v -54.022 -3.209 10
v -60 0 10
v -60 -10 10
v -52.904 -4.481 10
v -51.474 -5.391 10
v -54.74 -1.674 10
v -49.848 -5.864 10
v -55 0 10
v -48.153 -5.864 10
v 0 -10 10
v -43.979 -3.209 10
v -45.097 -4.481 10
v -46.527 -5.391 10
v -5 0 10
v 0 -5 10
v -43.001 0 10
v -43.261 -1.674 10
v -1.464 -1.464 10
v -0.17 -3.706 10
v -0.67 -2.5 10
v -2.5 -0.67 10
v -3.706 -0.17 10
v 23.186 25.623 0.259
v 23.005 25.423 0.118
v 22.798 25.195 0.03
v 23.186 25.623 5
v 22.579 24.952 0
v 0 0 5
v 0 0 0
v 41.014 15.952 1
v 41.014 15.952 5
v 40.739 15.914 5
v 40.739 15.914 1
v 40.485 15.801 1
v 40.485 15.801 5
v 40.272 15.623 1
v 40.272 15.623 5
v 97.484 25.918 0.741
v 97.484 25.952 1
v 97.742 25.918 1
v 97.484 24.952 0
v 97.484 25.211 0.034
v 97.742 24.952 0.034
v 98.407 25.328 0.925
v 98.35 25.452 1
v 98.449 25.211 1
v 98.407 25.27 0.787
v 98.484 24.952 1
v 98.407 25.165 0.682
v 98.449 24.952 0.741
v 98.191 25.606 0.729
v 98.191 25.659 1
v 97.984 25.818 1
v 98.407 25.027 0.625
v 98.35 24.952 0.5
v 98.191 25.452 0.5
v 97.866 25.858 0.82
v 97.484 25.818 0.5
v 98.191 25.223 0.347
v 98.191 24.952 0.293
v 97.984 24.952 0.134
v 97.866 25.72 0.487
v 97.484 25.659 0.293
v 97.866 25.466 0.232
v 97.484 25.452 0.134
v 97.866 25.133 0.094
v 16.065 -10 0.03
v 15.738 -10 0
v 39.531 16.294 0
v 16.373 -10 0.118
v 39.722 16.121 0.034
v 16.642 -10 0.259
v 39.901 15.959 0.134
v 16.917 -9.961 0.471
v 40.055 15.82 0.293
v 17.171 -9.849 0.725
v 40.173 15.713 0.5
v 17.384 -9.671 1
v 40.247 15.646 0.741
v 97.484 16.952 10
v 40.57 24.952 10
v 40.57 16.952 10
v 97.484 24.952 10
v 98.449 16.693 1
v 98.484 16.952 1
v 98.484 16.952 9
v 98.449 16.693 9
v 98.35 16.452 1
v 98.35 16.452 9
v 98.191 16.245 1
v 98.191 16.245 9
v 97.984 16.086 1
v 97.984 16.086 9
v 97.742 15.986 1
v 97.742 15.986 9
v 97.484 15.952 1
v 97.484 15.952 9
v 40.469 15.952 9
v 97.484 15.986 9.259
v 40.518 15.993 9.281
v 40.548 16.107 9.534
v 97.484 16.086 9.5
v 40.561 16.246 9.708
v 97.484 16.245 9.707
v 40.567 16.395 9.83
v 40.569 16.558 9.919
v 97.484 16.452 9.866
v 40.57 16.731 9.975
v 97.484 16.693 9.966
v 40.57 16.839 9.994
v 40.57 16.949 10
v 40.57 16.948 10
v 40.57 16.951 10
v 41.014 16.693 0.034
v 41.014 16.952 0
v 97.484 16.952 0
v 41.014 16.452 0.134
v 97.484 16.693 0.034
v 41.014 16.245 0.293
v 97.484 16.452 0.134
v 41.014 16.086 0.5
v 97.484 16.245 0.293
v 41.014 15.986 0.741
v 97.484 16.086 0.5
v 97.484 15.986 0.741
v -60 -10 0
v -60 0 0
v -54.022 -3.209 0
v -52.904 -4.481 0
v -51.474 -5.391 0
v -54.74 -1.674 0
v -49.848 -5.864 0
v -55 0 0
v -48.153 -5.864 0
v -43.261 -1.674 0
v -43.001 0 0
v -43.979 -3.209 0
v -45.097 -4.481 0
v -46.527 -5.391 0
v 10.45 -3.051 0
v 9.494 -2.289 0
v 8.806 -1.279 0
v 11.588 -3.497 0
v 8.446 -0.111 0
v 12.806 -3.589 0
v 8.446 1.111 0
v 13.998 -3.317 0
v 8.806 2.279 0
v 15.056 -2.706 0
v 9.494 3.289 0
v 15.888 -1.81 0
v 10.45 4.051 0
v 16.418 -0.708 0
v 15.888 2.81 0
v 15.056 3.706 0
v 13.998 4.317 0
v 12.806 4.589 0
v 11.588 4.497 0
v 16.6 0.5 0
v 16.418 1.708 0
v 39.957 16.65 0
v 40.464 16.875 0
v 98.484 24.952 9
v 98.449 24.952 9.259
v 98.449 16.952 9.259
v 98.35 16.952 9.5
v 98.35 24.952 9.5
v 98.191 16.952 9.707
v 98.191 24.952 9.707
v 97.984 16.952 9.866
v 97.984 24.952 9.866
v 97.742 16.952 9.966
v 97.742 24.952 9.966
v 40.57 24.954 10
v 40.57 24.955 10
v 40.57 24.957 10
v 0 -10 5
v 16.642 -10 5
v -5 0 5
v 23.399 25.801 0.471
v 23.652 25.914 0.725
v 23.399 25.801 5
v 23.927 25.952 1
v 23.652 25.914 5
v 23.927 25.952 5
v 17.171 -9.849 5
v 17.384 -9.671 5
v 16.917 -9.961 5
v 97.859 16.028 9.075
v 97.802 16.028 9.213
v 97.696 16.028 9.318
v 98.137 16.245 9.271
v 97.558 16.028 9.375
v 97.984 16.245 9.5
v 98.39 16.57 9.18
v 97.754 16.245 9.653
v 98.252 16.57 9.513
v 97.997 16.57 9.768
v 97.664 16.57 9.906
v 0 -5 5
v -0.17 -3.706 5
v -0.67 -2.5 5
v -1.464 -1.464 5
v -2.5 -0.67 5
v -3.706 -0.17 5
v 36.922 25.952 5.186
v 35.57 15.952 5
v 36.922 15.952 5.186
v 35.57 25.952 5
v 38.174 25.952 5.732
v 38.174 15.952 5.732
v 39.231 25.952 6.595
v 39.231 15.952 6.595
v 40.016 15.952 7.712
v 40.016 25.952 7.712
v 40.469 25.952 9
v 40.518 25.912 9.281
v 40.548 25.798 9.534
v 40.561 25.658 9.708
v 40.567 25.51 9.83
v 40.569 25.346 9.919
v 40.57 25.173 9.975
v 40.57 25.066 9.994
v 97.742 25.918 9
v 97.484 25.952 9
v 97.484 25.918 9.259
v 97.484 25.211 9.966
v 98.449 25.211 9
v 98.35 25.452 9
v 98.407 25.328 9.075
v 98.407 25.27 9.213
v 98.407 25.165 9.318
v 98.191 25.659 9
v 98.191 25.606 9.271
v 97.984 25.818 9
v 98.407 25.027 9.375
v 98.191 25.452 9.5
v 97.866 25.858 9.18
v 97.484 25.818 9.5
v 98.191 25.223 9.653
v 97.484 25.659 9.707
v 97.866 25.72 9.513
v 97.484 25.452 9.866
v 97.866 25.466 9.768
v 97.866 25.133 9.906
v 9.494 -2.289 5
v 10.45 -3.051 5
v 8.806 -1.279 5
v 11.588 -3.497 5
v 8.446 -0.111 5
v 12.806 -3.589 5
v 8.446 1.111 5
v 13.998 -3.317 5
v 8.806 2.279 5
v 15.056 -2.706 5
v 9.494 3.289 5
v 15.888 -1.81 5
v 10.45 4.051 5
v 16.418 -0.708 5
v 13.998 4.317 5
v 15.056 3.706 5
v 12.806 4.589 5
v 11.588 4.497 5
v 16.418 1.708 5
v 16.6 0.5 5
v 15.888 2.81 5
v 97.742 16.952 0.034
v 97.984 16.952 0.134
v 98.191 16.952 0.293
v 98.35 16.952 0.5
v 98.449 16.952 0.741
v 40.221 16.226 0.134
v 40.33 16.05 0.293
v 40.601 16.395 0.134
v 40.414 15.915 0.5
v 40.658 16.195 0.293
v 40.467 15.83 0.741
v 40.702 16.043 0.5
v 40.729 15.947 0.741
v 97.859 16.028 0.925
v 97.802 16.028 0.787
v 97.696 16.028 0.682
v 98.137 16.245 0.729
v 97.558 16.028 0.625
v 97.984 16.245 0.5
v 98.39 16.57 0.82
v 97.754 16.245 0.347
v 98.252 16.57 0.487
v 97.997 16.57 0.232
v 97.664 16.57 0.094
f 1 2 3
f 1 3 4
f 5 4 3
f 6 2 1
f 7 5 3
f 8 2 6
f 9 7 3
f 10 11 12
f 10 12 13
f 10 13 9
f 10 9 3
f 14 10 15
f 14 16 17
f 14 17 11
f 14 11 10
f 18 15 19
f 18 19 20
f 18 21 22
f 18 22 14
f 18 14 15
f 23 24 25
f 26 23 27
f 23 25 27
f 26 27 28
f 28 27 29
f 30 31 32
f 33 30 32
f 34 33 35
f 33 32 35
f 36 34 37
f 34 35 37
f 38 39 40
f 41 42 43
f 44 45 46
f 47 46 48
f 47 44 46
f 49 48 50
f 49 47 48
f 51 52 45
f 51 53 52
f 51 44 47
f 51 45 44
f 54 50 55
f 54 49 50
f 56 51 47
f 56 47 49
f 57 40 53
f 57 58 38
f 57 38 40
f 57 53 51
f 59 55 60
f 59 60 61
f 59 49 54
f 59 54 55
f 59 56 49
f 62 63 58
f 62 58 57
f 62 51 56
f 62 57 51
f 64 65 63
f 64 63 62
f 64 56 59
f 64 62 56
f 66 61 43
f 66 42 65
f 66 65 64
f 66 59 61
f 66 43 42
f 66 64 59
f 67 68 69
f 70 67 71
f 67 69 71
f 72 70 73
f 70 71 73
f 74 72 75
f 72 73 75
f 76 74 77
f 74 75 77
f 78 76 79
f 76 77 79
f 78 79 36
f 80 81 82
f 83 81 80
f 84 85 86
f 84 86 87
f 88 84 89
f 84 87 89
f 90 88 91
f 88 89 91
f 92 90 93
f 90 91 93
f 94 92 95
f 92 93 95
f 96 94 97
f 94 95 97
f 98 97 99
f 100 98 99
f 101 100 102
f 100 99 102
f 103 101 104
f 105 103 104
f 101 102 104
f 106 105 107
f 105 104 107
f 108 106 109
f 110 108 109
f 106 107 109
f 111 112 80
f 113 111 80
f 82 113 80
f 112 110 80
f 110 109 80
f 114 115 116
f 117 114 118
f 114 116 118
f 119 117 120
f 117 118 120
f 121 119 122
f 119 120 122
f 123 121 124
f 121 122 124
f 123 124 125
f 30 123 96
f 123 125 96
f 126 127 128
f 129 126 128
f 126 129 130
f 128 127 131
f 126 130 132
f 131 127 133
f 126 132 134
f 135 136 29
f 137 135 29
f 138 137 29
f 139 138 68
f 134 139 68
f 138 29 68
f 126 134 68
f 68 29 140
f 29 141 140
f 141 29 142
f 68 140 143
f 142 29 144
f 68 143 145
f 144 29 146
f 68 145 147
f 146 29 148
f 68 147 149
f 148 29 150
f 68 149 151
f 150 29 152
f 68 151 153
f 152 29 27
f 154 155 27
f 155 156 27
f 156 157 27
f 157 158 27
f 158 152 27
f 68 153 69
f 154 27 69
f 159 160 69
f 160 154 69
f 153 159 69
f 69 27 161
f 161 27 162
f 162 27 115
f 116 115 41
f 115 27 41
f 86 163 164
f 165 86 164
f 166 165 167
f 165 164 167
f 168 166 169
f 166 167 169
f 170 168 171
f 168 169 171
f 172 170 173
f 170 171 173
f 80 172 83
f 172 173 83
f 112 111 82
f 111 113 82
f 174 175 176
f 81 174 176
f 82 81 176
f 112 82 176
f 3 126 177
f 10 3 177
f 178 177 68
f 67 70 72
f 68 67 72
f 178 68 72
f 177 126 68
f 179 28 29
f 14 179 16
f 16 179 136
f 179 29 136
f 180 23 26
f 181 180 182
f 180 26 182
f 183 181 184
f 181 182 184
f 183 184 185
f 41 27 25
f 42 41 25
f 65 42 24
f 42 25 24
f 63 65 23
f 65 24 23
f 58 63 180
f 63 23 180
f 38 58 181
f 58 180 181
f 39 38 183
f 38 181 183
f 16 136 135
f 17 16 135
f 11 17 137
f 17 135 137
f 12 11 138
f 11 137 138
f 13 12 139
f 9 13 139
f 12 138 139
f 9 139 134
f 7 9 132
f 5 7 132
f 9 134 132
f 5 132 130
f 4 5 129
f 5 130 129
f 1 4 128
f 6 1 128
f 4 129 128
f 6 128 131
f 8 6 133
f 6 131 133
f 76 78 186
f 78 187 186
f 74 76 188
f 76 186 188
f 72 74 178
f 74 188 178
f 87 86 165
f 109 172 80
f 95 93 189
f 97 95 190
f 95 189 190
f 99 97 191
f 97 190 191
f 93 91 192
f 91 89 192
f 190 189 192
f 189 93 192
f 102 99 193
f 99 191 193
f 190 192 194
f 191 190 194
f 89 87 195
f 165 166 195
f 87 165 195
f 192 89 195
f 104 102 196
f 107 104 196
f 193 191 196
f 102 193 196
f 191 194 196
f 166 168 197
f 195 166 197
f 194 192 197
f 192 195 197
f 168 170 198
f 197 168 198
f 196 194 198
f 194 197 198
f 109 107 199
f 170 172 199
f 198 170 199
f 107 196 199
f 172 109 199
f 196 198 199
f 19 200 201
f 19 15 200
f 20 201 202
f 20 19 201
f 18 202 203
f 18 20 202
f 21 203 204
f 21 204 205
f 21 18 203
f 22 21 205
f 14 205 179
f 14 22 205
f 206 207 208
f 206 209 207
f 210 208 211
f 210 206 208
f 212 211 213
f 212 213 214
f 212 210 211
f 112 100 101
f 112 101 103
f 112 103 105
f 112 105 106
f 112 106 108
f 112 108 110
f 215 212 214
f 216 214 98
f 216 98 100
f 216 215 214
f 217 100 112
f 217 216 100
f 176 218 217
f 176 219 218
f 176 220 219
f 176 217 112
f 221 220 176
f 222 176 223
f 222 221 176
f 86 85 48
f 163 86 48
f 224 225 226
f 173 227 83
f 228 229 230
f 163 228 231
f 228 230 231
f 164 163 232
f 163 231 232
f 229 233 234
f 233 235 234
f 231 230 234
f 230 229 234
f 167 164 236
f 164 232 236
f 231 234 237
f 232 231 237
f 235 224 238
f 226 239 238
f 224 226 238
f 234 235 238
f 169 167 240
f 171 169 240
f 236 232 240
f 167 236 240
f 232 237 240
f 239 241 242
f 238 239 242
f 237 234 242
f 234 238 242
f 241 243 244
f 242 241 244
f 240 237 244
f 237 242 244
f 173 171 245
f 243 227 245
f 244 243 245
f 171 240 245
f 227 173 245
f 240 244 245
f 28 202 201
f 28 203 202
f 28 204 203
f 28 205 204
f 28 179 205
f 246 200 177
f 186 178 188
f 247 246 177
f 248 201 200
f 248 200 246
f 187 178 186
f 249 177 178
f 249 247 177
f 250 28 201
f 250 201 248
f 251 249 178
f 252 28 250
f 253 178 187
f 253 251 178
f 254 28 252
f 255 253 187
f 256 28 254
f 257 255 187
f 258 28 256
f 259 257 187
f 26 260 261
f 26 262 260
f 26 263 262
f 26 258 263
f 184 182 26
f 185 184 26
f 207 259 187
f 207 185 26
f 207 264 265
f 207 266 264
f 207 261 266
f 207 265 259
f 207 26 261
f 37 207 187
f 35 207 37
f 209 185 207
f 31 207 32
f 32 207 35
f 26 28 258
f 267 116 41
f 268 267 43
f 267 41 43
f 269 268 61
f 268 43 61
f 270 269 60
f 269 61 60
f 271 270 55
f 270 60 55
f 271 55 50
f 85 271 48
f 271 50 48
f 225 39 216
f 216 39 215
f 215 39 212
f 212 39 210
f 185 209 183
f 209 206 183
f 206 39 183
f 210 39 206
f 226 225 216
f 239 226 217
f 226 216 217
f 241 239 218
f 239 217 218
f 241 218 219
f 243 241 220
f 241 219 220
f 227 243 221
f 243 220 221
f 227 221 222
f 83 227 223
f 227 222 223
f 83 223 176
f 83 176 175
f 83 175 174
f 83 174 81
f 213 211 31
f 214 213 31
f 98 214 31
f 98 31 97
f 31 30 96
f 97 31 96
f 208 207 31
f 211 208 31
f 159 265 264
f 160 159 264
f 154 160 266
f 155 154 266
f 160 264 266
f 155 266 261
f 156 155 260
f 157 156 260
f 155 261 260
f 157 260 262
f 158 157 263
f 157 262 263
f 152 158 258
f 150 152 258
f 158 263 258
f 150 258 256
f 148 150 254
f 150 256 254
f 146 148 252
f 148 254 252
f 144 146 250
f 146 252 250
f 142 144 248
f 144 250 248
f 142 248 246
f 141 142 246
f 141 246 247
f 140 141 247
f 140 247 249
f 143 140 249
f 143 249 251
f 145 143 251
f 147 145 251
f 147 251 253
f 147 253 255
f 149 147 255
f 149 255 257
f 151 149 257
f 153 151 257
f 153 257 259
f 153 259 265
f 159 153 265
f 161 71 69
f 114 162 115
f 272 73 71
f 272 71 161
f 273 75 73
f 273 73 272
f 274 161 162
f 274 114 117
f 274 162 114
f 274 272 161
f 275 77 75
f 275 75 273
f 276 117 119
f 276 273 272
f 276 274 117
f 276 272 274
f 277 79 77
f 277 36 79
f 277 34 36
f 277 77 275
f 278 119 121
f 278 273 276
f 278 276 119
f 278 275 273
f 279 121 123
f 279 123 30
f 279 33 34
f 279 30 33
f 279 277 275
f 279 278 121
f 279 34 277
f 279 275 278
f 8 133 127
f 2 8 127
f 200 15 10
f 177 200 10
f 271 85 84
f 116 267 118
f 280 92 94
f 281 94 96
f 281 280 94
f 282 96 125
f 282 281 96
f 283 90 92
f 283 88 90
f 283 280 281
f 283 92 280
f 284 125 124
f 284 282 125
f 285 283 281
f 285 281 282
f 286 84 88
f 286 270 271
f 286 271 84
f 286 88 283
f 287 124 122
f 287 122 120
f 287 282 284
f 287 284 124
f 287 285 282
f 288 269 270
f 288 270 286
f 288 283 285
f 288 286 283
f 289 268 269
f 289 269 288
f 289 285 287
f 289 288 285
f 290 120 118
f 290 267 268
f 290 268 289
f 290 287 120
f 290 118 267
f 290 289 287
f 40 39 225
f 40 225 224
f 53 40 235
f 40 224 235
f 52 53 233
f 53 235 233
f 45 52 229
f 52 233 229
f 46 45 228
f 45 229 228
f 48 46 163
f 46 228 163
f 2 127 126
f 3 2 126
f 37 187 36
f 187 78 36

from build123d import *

# Parameters (mm, degrees)
F1_DEPTH = 10
F2_R     = 4.1
F3_DEPTH = 5
F4_DEPTH = 10
F5_R     = 1
F6_R     = 4.99999
F7_R     = 5


# Not quite as in the source:
# - a fillet or chamfer is up to 0.001 mm smaller than in the source, because OpenCascade refuses the exact size


with BuildPart() as f1:
    # F0 (on Top) → F1 (new body)
    with BuildSketch(Plane.XY):
        with BuildLine():
            Line((23.4835705605, 25.9523007406), (0, 0))
            Line((0, 0), (-43.0009548823, 0))
            ThreePointArc((-43.0009548823, 0), (-49.0004774411, -5.9243094089), (-55, 0))
            Line((-55, 0), (-60, 0))
            Line((-60, 0), (-60, -10))
            Line((-60, -10), (17.0862320811, -10))
            Line((17.0862320811, -10), (40.5698026416, 15.9523007406))
            Line((40.5698026416, 15.9523007406), (98.4835705605, 15.9523007406))
            Line((98.4835705605, 15.9523007406), (98.4835705605, 25.9523007406))
            Line((98.4835705605, 25.9523007406), (23.4835705605, 25.9523007406))
        make_face()
    extrude(amount=F1_DEPTH)

    # F2 (on face) → F3 (cut)
    with BuildSketch(Plane.XY.offset(10)):
        Polygon((0, -10), (17.0862320811, -10), (40.5698026416, 15.9523007406), (40.5698026416, 25.9523007406), (23.4835705605, 25.9523007406), (0, 0), align=None)
        with Locations((12.5, 0.5)):
            Circle(F2_R, mode=Mode.SUBTRACT)
    extrude(amount=-F3_DEPTH, mode=Mode.SUBTRACT)

    # F4 (cut, through all): a face of the model
    f4_faces = [f1.faces().sort_by_distance(p)[0] for p in [
        (12.5, 0.5, 10),
    ]]
    extrude(f4_faces, amount=-F4_DEPTH, mode=Mode.SUBTRACT)

    # F5
    f5_edges = [f1.edges().sort_by_distance(p)[0] for p in [
        (60.983571, 25.952301, 0),
        (69.526687, 25.952301, 10),
        (98.483571, 25.952301, 5),
        (98.483571, 20.952301, 0),
        (98.483571, 20.952301, 10),
        (98.483571, 15.952301, 5),
        (69.526687, 15.952301, 0),
        (69.526687, 15.952301, 10),
        (23.483571, 25.952301, 2.5),
        (17.086232, -10, 2.5),
        (40.569803, 15.952301, 2.5),
        (28.828017, 2.97615, 0),
    ]]
    fillet(f5_edges, radius=F5_R)

    # F6 (radius 5 in the source; OpenCascade refuses exactly that, so slightly less here)
    f6_edges = [f1.edges().sort_by_distance(p)[0] for p in [
        (40.569803, 20.952301, 5),
    ]]
    fillet(f6_edges, radius=F6_R)

    # F7
    f7_edges = [f1.edges().sort_by_distance(p)[0] for p in [
        (0, 0, 7.5),
    ]]
    fillet(f7_edges, radius=F7_R)


solid = f1.part
